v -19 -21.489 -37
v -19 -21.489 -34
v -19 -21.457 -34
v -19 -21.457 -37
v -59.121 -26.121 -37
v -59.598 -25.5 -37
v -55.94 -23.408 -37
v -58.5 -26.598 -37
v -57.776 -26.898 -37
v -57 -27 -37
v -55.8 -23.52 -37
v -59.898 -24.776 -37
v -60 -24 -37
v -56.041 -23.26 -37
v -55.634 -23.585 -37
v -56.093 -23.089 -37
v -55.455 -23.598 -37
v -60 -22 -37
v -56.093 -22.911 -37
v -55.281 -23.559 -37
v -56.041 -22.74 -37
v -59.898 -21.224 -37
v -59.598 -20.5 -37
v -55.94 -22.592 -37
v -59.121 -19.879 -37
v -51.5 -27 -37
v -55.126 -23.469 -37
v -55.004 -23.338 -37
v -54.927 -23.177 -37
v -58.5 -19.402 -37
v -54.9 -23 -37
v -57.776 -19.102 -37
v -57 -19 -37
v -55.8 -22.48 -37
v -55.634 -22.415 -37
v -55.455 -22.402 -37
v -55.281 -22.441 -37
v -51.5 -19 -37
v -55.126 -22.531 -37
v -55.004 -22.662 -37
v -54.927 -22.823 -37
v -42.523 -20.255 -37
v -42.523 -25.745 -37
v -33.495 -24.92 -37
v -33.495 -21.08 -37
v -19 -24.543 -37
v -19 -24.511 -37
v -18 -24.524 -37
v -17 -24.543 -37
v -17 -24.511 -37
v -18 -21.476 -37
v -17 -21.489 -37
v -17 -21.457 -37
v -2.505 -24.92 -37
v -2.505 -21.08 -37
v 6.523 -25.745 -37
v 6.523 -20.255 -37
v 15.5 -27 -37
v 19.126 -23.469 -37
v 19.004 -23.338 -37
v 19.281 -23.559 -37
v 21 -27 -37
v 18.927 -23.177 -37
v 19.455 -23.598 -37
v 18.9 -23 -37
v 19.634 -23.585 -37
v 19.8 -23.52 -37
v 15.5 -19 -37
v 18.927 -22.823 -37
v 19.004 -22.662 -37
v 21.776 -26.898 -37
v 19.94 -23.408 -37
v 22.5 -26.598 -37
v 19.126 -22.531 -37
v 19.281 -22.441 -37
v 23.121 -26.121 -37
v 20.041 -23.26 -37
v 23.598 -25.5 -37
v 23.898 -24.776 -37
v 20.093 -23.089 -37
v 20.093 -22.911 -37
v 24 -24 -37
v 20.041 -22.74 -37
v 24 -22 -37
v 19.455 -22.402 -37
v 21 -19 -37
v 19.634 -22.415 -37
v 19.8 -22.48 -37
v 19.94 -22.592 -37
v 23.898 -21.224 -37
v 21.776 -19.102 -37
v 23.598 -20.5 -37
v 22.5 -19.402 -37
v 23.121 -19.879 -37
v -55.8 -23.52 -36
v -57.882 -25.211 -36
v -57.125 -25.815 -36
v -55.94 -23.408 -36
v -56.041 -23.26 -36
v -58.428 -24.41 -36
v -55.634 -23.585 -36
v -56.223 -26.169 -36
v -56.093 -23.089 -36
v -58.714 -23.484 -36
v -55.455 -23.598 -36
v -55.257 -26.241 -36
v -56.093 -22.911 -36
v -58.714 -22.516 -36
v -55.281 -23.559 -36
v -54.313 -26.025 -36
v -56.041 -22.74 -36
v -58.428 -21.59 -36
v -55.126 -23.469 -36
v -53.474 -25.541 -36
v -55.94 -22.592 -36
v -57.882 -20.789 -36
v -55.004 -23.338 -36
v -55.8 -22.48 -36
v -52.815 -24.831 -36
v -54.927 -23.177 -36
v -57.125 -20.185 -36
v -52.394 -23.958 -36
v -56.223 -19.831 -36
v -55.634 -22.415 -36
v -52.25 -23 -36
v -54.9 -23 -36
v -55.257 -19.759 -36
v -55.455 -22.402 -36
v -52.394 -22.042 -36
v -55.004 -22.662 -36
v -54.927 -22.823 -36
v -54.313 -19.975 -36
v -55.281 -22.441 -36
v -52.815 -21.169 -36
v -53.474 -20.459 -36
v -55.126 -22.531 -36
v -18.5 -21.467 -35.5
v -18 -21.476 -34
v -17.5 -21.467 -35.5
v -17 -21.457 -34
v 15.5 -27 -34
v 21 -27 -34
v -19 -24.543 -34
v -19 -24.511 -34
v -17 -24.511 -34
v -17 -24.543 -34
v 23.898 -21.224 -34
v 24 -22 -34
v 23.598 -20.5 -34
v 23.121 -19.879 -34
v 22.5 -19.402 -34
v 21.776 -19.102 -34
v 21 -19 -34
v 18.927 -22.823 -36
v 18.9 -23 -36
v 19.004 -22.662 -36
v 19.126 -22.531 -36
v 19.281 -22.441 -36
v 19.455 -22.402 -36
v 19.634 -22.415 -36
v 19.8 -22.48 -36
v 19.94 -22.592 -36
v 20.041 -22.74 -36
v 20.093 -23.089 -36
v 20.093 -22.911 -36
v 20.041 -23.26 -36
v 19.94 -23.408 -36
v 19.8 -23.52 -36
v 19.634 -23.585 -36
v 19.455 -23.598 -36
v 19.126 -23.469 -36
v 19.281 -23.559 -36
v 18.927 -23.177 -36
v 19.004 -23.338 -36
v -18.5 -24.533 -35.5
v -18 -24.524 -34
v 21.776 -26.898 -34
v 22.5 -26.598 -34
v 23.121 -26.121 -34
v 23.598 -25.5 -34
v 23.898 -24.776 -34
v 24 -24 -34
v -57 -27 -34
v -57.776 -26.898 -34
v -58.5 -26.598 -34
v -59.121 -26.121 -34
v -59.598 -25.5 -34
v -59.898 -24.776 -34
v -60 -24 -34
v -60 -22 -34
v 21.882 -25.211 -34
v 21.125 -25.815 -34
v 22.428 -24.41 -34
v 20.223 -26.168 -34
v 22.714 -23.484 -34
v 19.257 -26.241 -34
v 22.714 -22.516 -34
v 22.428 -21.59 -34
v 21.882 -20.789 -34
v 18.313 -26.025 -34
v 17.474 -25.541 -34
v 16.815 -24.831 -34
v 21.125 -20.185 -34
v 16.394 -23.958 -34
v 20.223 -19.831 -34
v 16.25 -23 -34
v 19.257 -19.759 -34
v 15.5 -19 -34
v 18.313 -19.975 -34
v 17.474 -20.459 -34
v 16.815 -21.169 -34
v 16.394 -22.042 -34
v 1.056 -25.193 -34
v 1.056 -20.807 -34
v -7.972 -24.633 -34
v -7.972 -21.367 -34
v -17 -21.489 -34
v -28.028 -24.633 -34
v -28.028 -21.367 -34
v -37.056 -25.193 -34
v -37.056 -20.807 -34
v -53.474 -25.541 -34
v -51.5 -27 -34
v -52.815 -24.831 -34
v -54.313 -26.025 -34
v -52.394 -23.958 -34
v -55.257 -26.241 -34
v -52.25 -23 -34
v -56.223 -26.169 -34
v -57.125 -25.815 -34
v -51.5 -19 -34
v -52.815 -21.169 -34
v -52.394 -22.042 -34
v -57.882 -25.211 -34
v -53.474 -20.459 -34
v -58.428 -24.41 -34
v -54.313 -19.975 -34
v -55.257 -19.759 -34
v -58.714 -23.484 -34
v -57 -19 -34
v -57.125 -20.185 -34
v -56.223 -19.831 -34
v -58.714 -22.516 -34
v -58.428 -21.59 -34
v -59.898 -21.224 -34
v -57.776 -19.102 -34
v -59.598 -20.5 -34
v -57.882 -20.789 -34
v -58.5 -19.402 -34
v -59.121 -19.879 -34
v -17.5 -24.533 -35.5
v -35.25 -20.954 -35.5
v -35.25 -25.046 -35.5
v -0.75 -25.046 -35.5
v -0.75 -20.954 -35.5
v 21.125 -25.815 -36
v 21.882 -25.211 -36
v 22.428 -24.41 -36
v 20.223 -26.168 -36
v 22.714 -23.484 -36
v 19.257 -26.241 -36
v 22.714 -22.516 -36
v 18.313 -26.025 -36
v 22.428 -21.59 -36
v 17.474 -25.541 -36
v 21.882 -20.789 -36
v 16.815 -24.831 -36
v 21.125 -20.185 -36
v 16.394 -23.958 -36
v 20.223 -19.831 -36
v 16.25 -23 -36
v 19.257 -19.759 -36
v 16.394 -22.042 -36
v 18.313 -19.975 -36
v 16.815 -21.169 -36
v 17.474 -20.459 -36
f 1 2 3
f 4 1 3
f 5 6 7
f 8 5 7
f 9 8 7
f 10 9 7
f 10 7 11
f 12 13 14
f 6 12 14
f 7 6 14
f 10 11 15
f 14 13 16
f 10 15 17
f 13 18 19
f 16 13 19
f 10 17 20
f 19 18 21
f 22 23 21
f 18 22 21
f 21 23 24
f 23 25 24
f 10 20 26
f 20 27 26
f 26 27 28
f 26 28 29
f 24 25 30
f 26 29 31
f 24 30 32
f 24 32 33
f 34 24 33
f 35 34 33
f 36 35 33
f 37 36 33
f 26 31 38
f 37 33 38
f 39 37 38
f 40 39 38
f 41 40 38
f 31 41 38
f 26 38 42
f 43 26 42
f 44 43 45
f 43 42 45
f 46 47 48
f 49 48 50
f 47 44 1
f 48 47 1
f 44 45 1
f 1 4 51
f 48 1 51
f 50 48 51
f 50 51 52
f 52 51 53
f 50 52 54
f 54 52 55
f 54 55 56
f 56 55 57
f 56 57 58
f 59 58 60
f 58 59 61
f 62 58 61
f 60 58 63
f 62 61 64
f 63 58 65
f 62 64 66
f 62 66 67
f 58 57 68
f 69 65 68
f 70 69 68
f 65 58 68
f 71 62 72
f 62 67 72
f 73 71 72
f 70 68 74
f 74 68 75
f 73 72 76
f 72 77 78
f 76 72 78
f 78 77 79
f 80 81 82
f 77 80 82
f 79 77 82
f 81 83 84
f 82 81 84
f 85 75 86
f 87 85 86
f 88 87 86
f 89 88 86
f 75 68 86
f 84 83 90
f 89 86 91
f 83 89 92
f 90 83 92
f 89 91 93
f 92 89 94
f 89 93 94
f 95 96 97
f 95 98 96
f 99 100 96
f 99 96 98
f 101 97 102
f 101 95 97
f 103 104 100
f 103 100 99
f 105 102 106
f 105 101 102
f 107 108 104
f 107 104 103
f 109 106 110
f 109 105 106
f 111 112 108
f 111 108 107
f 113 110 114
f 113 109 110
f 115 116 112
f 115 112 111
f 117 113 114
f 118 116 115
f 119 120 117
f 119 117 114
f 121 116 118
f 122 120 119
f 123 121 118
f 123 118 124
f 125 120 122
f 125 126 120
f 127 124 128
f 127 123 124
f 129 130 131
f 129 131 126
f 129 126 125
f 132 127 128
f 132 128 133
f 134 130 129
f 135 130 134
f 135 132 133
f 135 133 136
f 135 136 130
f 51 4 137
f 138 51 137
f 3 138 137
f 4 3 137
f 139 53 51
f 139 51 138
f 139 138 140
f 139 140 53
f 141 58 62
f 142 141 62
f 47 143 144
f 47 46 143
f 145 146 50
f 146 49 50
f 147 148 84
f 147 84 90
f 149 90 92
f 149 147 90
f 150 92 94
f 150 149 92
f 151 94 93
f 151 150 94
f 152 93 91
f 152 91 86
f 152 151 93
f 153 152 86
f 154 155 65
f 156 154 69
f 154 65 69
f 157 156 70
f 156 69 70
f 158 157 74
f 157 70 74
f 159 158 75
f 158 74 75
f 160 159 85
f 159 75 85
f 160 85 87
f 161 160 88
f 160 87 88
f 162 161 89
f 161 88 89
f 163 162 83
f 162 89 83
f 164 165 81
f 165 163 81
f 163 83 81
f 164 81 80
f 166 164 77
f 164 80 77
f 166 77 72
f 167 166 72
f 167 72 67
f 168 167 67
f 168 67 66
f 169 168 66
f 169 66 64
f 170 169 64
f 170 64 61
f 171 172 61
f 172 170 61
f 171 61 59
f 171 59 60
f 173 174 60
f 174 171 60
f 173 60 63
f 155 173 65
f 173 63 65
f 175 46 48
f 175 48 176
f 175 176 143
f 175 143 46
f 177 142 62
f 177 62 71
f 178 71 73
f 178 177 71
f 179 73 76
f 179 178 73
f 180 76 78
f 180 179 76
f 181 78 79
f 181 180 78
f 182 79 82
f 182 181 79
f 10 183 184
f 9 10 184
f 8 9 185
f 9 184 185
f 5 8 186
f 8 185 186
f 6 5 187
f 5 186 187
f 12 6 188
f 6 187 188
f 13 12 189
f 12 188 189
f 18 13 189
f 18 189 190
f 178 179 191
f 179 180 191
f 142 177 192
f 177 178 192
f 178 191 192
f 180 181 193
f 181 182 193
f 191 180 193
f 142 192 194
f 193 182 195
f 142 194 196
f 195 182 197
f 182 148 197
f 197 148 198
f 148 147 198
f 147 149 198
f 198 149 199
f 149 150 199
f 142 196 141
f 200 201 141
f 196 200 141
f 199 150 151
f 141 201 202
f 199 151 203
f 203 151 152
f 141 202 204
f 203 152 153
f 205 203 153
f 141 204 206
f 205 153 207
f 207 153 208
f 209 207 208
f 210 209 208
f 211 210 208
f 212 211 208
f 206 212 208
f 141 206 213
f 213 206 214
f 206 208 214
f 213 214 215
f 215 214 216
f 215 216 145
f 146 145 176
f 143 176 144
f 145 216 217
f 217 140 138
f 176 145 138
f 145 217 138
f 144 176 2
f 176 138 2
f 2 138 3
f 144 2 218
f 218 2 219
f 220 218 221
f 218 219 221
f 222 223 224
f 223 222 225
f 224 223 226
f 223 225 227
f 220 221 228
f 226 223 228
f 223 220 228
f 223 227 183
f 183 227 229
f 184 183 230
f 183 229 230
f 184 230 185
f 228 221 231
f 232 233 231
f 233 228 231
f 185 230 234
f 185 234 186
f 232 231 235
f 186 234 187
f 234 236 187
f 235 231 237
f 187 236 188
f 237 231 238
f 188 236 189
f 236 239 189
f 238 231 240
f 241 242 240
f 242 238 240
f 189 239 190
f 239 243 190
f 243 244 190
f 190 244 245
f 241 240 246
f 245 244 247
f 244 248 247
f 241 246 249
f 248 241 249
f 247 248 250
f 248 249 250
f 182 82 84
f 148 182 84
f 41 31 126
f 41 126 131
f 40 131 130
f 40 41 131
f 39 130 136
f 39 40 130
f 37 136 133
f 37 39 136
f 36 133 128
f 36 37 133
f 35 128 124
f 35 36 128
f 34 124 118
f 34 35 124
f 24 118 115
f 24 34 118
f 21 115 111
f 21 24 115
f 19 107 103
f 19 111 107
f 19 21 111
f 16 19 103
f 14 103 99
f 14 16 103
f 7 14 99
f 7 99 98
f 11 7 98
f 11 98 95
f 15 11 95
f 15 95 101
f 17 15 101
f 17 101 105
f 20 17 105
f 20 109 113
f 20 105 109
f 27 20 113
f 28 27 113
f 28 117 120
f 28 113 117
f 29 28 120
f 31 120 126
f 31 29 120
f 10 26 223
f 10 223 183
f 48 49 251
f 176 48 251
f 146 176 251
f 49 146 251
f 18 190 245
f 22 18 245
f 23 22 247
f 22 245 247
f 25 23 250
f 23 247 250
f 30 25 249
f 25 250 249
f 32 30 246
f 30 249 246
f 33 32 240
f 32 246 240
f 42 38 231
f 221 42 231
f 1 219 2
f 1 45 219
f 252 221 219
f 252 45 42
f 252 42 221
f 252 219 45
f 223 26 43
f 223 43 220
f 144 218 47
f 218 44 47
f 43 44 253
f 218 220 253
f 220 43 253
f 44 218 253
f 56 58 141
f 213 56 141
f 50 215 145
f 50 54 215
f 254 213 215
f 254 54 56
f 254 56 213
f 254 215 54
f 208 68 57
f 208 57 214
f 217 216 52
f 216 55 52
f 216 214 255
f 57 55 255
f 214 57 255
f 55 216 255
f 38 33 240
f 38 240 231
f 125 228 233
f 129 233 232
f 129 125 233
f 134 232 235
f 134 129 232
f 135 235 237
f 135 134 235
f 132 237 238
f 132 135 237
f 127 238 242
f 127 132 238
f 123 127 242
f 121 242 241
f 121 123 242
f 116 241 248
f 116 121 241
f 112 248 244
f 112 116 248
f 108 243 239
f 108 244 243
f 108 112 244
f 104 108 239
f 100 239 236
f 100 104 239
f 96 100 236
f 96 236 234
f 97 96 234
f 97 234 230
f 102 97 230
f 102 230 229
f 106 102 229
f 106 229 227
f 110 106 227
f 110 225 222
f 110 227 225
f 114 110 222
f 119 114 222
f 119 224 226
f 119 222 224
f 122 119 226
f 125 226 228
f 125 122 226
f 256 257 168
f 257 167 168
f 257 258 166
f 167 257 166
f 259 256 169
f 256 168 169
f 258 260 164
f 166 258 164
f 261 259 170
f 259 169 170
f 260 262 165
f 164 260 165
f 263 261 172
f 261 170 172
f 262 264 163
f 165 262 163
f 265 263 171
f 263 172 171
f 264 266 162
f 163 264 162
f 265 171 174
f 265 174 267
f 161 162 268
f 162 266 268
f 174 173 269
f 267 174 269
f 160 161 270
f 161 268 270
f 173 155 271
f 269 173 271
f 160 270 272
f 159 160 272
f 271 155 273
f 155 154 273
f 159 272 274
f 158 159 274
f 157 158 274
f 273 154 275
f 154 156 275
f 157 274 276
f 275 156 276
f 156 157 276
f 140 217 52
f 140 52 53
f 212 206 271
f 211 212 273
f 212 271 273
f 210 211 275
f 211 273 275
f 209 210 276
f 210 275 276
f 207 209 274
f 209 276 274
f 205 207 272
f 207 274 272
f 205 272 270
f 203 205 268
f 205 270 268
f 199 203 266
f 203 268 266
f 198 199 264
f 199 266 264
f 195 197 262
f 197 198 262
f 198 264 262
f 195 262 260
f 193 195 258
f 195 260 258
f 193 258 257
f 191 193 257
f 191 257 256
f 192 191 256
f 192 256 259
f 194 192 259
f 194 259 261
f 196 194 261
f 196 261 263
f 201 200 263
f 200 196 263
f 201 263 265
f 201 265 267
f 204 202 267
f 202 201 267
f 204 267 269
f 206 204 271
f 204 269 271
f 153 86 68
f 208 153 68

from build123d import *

# Parameters (mm, degrees)
BOX126_W                          = 90
BOX126_H                          = 9
BOX126_DEPTH                      = 4
BOX125_W                          = 40
BOX125_H                          = 10
BOX125_DEPTH                      = 10
CYLINDER211_R                     = 3.25
CYLINDER211_DEPTH                 = 3.5
CYLINDER212_R                     = 0.6
CYLINDER212_DEPTH                 = 9.5
CYLINDER210_R                     = 0.6
CYLINDER210_DEPTH                 = 9.5
CYLINDER209_R                     = 3.25
CYLINDER209_DEPTH                 = 3.5
PAD016_DEPTH                      = 4
FILLET087_R                       = 3
PART_MIRRORING004_PLACEMENT_ANGLE = 180
BOX123_W                          = 40
BOX123_H                          = 10
BOX123_DEPTH                      = 10
CYLINDER205_R                     = 3.25
CYLINDER205_DEPTH                 = 3.5
CYLINDER208_R                     = 0.6
CYLINDER208_DEPTH                 = 9.5
CYLINDER206_R                     = 0.6
CYLINDER206_DEPTH                 = 9.5
CYLINDER207_R                     = 3.25
CYLINDER207_DEPTH                 = 3.5
PAD017_DEPTH                      = 4
FILLET086_R                       = 3


with BuildPart() as w_rfel116:
    # Box126 → Box126 (new body)
    with BuildSketch(Plane(origin=(-63, -27.5, -41), x_dir=(1, 0, 0), z_dir=(0, 0, 1))):
        with Locations((45, 4.5)):
            Rectangle(BOX126_W, BOX126_H)
    extrude(amount=BOX126_DEPTH)


with BuildPart() as w_rfel115:
    # Box125 → Box125 (new body)
    with BuildSketch(Plane(origin=(-14, -72, -42), x_dir=(1, 0, 0), z_dir=(0, 0, 1))):
        with Locations((20, 5)):
            Rectangle(BOX125_W, BOX125_H)
    extrude(amount=BOX125_DEPTH)


with BuildPart() as zylinder211:
    # Cylinder211 → Cylinder211 (new body)
    with BuildSketch(Plane(origin=(-52.5, 23, -36), x_dir=(1, 0, 0), z_dir=(0, 0, 1))):
        Circle(CYLINDER211_R)
    extrude(amount=CYLINDER211_DEPTH)


with BuildPart() as zylinder212:
    # Cylinder212 → Cylinder212 (new body)
    with BuildSketch(Plane(origin=(16.5, 23, -39), x_dir=(1, 0, 0), z_dir=(0, 0, 1))):
        Circle(CYLINDER212_R)
    extrude(amount=CYLINDER212_DEPTH)


with BuildPart() as zylinder210:
    # Cylinder210 → Cylinder210 (new body)
    with BuildSketch(Plane(origin=(-52.5, 23, -39), x_dir=(1, 0, 0), z_dir=(0, 0, 1))):
        Circle(CYLINDER210_R)
    extrude(amount=CYLINDER210_DEPTH)


with BuildPart() as fusion135:
    # Cylinder209 → Cylinder209 (new body)
    with BuildSketch(Plane(origin=(16.5, 23, -36), x_dir=(1, 0, 0), z_dir=(0, 0, 1))):
        Circle(CYLINDER209_R)
    extrude(amount=CYLINDER209_DEPTH)

    # Fusion135: union Zylinder211, Zylinder212, Zylinder210
    add(zylinder211.part)
    add(zylinder212.part)
    add(zylinder210.part)


with BuildPart() as cut090:
    # Sketch017 → Pad016 (new body)
    with BuildSketch(Plane.XY):
        with BuildLine():
            add(Edge.make_bspline(
                [(-48.5, 19), (-18, 24), (12.5, 19)],
                knots=[0, 0, 0, 1, 1, 1], degree=2))
            Line((-48.5, 19), (-57, 19))
            Line((-57, 19), (-57, 27))
            Line((-57, 27), (-48.5, 27))
            add(Edge.make_bspline(
                [(-48.5, 27), (-18, 22), (12.5, 27)],
                knots=[0, 0, 0, 1, 1, 1], degree=2))
            Line((12.5, 27), (21, 27))
            Line((21, 27), (21, 19))
            Line((21, 19), (12.5, 19))
        make_face()
    extrude(amount=PAD016_DEPTH)


with BuildPart() as cut090_1:
    # Body007 placement: moved
    add(cut090.part.moved(Location((0, 0, -38))))

    # Cut088: cut Fusion135
    add(fusion135.part, mode=Mode.SUBTRACT)

    # Fillet087
    fillet087_edges = [cut090_1.edges().sort_by_distance(p)[0] for p in [
        (-57, 19, -36),
        (21, 19, -36),
        (-57, 27, -36),
        (21, 27, -36),
    ]]
    fillet(fillet087_edges, radius=FILLET087_R)


with BuildPart() as cut090_2:
    # Fillet087 placement: moved
    add(cut090_1.part.moved(Location((0, -90, 0))))

    # Cut090: cut Würfel115
    add(w_rfel115.part, mode=Mode.SUBTRACT)


with BuildPart() as cut090_3:
    # Cut090 placement: moved
    add(cut090_2.part.moved(Location((-5, 35, 0))))


with BuildPart() as part_mirroring004:
    # Part__Mirroring004: instance of Cut090
    add(cut090_3.part.mirror(Plane(origin=(-40.5, -8e-06, -36), x_dir=(1, 0, 0), z_dir=(0, 1, 0))))


with BuildPart() as part_mirroring004_1:
    # Part__Mirroring004 placement: moved
    add(part_mirroring004.part.moved(Location((-38, 9, 0))).rotate(Axis((-38, 9, 0), (0, 0, 1)), PART_MIRRORING004_PLACEMENT_ANGLE))


with BuildPart() as w_rfel113:
    # Box123 → Box123 (new body)
    with BuildSketch(Plane(origin=(-14, -72, -42), x_dir=(1, 0, 0), z_dir=(0, 0, 1))):
        with Locations((20, 5)):
            Rectangle(BOX123_W, BOX123_H)
    extrude(amount=BOX123_DEPTH)


with BuildPart() as zylinder205:
    # Cylinder205 → Cylinder205 (new body)
    with BuildSketch(Plane(origin=(-52.5, 23, -36), x_dir=(1, 0, 0), z_dir=(0, 0, 1))):
        Circle(CYLINDER205_R)
    extrude(amount=CYLINDER205_DEPTH)


with BuildPart() as zylinder208:
    # Cylinder208 → Cylinder208 (new body)
    with BuildSketch(Plane(origin=(16.5, 23, -39), x_dir=(1, 0, 0), z_dir=(0, 0, 1))):
        Circle(CYLINDER208_R)
    extrude(amount=CYLINDER208_DEPTH)


with BuildPart() as zylinder206:
    # Cylinder206 → Cylinder206 (new body)
    with BuildSketch(Plane(origin=(-52.5, 23, -39), x_dir=(1, 0, 0), z_dir=(0, 0, 1))):
        Circle(CYLINDER206_R)
    extrude(amount=CYLINDER206_DEPTH)


with BuildPart() as fusion134:
    # Cylinder207 → Cylinder207 (new body)
    with BuildSketch(Plane(origin=(16.5, 23, -36), x_dir=(1, 0, 0), z_dir=(0, 0, 1))):
        Circle(CYLINDER207_R)
    extrude(amount=CYLINDER207_DEPTH)

    # Fusion134: union Zylinder205, Zylinder208, Zylinder206
    add(zylinder205.part)
    add(zylinder208.part)
    add(zylinder206.part)


with BuildPart() as bar_medium_long:
    # Sketch016 → Pad017 (new body)
    with BuildSketch(Plane.XY):
        with BuildLine():
            add(Edge.make_bspline(
                [(-48.5, 19), (-18, 24), (12.5, 19)],
                knots=[0, 0, 0, 1, 1, 1], degree=2))
            Line((-48.5, 19), (-57, 19))
            Line((-57, 19), (-57, 27))
            Line((-57, 27), (-48.5, 27))
            add(Edge.make_bspline(
                [(-48.5, 27), (-18, 22), (12.5, 27)],
                knots=[0, 0, 0, 1, 1, 1], degree=2))
            Line((12.5, 27), (21, 27))
            Line((21, 27), (21, 19))
            Line((21, 19), (12.5, 19))
        make_face()
    extrude(amount=PAD017_DEPTH)


with BuildPart() as bar_medium_long_1:
    # Body008 placement: moved
    add(bar_medium_long.part.moved(Location((0, 0, -38))))

    # Cut086: cut Fusion134
    add(fusion134.part, mode=Mode.SUBTRACT)

    # Fillet086
    fillet086_edges = [bar_medium_long_1.edges().sort_by_distance(p)[0] for p in [
        (-57, 19, -36),
        (21, 19, -36),
        (-57, 27, -36),
        (21, 27, -36),
    ]]
    fillet(fillet086_edges, radius=FILLET086_R)


with BuildPart() as bar_medium_long_2:
    # Fillet086 placement: moved
    add(bar_medium_long_1.part.moved(Location((0, -90, 0))))

    # Cut087: cut Würfel113
    add(w_rfel113.part, mode=Mode.SUBTRACT)


with BuildPart() as bar_medium_long_3:
    # Cut087 placement: moved
    add(bar_medium_long_2.part.moved(Location((-3, 44, 0))))

    # Fusion136: union Part__Mirroring004
    add(part_mirroring004_1.part)

    # Cut091: cut Würfel116
    add(w_rfel116.part, mode=Mode.SUBTRACT)


solid = bar_medium_long_3.part
